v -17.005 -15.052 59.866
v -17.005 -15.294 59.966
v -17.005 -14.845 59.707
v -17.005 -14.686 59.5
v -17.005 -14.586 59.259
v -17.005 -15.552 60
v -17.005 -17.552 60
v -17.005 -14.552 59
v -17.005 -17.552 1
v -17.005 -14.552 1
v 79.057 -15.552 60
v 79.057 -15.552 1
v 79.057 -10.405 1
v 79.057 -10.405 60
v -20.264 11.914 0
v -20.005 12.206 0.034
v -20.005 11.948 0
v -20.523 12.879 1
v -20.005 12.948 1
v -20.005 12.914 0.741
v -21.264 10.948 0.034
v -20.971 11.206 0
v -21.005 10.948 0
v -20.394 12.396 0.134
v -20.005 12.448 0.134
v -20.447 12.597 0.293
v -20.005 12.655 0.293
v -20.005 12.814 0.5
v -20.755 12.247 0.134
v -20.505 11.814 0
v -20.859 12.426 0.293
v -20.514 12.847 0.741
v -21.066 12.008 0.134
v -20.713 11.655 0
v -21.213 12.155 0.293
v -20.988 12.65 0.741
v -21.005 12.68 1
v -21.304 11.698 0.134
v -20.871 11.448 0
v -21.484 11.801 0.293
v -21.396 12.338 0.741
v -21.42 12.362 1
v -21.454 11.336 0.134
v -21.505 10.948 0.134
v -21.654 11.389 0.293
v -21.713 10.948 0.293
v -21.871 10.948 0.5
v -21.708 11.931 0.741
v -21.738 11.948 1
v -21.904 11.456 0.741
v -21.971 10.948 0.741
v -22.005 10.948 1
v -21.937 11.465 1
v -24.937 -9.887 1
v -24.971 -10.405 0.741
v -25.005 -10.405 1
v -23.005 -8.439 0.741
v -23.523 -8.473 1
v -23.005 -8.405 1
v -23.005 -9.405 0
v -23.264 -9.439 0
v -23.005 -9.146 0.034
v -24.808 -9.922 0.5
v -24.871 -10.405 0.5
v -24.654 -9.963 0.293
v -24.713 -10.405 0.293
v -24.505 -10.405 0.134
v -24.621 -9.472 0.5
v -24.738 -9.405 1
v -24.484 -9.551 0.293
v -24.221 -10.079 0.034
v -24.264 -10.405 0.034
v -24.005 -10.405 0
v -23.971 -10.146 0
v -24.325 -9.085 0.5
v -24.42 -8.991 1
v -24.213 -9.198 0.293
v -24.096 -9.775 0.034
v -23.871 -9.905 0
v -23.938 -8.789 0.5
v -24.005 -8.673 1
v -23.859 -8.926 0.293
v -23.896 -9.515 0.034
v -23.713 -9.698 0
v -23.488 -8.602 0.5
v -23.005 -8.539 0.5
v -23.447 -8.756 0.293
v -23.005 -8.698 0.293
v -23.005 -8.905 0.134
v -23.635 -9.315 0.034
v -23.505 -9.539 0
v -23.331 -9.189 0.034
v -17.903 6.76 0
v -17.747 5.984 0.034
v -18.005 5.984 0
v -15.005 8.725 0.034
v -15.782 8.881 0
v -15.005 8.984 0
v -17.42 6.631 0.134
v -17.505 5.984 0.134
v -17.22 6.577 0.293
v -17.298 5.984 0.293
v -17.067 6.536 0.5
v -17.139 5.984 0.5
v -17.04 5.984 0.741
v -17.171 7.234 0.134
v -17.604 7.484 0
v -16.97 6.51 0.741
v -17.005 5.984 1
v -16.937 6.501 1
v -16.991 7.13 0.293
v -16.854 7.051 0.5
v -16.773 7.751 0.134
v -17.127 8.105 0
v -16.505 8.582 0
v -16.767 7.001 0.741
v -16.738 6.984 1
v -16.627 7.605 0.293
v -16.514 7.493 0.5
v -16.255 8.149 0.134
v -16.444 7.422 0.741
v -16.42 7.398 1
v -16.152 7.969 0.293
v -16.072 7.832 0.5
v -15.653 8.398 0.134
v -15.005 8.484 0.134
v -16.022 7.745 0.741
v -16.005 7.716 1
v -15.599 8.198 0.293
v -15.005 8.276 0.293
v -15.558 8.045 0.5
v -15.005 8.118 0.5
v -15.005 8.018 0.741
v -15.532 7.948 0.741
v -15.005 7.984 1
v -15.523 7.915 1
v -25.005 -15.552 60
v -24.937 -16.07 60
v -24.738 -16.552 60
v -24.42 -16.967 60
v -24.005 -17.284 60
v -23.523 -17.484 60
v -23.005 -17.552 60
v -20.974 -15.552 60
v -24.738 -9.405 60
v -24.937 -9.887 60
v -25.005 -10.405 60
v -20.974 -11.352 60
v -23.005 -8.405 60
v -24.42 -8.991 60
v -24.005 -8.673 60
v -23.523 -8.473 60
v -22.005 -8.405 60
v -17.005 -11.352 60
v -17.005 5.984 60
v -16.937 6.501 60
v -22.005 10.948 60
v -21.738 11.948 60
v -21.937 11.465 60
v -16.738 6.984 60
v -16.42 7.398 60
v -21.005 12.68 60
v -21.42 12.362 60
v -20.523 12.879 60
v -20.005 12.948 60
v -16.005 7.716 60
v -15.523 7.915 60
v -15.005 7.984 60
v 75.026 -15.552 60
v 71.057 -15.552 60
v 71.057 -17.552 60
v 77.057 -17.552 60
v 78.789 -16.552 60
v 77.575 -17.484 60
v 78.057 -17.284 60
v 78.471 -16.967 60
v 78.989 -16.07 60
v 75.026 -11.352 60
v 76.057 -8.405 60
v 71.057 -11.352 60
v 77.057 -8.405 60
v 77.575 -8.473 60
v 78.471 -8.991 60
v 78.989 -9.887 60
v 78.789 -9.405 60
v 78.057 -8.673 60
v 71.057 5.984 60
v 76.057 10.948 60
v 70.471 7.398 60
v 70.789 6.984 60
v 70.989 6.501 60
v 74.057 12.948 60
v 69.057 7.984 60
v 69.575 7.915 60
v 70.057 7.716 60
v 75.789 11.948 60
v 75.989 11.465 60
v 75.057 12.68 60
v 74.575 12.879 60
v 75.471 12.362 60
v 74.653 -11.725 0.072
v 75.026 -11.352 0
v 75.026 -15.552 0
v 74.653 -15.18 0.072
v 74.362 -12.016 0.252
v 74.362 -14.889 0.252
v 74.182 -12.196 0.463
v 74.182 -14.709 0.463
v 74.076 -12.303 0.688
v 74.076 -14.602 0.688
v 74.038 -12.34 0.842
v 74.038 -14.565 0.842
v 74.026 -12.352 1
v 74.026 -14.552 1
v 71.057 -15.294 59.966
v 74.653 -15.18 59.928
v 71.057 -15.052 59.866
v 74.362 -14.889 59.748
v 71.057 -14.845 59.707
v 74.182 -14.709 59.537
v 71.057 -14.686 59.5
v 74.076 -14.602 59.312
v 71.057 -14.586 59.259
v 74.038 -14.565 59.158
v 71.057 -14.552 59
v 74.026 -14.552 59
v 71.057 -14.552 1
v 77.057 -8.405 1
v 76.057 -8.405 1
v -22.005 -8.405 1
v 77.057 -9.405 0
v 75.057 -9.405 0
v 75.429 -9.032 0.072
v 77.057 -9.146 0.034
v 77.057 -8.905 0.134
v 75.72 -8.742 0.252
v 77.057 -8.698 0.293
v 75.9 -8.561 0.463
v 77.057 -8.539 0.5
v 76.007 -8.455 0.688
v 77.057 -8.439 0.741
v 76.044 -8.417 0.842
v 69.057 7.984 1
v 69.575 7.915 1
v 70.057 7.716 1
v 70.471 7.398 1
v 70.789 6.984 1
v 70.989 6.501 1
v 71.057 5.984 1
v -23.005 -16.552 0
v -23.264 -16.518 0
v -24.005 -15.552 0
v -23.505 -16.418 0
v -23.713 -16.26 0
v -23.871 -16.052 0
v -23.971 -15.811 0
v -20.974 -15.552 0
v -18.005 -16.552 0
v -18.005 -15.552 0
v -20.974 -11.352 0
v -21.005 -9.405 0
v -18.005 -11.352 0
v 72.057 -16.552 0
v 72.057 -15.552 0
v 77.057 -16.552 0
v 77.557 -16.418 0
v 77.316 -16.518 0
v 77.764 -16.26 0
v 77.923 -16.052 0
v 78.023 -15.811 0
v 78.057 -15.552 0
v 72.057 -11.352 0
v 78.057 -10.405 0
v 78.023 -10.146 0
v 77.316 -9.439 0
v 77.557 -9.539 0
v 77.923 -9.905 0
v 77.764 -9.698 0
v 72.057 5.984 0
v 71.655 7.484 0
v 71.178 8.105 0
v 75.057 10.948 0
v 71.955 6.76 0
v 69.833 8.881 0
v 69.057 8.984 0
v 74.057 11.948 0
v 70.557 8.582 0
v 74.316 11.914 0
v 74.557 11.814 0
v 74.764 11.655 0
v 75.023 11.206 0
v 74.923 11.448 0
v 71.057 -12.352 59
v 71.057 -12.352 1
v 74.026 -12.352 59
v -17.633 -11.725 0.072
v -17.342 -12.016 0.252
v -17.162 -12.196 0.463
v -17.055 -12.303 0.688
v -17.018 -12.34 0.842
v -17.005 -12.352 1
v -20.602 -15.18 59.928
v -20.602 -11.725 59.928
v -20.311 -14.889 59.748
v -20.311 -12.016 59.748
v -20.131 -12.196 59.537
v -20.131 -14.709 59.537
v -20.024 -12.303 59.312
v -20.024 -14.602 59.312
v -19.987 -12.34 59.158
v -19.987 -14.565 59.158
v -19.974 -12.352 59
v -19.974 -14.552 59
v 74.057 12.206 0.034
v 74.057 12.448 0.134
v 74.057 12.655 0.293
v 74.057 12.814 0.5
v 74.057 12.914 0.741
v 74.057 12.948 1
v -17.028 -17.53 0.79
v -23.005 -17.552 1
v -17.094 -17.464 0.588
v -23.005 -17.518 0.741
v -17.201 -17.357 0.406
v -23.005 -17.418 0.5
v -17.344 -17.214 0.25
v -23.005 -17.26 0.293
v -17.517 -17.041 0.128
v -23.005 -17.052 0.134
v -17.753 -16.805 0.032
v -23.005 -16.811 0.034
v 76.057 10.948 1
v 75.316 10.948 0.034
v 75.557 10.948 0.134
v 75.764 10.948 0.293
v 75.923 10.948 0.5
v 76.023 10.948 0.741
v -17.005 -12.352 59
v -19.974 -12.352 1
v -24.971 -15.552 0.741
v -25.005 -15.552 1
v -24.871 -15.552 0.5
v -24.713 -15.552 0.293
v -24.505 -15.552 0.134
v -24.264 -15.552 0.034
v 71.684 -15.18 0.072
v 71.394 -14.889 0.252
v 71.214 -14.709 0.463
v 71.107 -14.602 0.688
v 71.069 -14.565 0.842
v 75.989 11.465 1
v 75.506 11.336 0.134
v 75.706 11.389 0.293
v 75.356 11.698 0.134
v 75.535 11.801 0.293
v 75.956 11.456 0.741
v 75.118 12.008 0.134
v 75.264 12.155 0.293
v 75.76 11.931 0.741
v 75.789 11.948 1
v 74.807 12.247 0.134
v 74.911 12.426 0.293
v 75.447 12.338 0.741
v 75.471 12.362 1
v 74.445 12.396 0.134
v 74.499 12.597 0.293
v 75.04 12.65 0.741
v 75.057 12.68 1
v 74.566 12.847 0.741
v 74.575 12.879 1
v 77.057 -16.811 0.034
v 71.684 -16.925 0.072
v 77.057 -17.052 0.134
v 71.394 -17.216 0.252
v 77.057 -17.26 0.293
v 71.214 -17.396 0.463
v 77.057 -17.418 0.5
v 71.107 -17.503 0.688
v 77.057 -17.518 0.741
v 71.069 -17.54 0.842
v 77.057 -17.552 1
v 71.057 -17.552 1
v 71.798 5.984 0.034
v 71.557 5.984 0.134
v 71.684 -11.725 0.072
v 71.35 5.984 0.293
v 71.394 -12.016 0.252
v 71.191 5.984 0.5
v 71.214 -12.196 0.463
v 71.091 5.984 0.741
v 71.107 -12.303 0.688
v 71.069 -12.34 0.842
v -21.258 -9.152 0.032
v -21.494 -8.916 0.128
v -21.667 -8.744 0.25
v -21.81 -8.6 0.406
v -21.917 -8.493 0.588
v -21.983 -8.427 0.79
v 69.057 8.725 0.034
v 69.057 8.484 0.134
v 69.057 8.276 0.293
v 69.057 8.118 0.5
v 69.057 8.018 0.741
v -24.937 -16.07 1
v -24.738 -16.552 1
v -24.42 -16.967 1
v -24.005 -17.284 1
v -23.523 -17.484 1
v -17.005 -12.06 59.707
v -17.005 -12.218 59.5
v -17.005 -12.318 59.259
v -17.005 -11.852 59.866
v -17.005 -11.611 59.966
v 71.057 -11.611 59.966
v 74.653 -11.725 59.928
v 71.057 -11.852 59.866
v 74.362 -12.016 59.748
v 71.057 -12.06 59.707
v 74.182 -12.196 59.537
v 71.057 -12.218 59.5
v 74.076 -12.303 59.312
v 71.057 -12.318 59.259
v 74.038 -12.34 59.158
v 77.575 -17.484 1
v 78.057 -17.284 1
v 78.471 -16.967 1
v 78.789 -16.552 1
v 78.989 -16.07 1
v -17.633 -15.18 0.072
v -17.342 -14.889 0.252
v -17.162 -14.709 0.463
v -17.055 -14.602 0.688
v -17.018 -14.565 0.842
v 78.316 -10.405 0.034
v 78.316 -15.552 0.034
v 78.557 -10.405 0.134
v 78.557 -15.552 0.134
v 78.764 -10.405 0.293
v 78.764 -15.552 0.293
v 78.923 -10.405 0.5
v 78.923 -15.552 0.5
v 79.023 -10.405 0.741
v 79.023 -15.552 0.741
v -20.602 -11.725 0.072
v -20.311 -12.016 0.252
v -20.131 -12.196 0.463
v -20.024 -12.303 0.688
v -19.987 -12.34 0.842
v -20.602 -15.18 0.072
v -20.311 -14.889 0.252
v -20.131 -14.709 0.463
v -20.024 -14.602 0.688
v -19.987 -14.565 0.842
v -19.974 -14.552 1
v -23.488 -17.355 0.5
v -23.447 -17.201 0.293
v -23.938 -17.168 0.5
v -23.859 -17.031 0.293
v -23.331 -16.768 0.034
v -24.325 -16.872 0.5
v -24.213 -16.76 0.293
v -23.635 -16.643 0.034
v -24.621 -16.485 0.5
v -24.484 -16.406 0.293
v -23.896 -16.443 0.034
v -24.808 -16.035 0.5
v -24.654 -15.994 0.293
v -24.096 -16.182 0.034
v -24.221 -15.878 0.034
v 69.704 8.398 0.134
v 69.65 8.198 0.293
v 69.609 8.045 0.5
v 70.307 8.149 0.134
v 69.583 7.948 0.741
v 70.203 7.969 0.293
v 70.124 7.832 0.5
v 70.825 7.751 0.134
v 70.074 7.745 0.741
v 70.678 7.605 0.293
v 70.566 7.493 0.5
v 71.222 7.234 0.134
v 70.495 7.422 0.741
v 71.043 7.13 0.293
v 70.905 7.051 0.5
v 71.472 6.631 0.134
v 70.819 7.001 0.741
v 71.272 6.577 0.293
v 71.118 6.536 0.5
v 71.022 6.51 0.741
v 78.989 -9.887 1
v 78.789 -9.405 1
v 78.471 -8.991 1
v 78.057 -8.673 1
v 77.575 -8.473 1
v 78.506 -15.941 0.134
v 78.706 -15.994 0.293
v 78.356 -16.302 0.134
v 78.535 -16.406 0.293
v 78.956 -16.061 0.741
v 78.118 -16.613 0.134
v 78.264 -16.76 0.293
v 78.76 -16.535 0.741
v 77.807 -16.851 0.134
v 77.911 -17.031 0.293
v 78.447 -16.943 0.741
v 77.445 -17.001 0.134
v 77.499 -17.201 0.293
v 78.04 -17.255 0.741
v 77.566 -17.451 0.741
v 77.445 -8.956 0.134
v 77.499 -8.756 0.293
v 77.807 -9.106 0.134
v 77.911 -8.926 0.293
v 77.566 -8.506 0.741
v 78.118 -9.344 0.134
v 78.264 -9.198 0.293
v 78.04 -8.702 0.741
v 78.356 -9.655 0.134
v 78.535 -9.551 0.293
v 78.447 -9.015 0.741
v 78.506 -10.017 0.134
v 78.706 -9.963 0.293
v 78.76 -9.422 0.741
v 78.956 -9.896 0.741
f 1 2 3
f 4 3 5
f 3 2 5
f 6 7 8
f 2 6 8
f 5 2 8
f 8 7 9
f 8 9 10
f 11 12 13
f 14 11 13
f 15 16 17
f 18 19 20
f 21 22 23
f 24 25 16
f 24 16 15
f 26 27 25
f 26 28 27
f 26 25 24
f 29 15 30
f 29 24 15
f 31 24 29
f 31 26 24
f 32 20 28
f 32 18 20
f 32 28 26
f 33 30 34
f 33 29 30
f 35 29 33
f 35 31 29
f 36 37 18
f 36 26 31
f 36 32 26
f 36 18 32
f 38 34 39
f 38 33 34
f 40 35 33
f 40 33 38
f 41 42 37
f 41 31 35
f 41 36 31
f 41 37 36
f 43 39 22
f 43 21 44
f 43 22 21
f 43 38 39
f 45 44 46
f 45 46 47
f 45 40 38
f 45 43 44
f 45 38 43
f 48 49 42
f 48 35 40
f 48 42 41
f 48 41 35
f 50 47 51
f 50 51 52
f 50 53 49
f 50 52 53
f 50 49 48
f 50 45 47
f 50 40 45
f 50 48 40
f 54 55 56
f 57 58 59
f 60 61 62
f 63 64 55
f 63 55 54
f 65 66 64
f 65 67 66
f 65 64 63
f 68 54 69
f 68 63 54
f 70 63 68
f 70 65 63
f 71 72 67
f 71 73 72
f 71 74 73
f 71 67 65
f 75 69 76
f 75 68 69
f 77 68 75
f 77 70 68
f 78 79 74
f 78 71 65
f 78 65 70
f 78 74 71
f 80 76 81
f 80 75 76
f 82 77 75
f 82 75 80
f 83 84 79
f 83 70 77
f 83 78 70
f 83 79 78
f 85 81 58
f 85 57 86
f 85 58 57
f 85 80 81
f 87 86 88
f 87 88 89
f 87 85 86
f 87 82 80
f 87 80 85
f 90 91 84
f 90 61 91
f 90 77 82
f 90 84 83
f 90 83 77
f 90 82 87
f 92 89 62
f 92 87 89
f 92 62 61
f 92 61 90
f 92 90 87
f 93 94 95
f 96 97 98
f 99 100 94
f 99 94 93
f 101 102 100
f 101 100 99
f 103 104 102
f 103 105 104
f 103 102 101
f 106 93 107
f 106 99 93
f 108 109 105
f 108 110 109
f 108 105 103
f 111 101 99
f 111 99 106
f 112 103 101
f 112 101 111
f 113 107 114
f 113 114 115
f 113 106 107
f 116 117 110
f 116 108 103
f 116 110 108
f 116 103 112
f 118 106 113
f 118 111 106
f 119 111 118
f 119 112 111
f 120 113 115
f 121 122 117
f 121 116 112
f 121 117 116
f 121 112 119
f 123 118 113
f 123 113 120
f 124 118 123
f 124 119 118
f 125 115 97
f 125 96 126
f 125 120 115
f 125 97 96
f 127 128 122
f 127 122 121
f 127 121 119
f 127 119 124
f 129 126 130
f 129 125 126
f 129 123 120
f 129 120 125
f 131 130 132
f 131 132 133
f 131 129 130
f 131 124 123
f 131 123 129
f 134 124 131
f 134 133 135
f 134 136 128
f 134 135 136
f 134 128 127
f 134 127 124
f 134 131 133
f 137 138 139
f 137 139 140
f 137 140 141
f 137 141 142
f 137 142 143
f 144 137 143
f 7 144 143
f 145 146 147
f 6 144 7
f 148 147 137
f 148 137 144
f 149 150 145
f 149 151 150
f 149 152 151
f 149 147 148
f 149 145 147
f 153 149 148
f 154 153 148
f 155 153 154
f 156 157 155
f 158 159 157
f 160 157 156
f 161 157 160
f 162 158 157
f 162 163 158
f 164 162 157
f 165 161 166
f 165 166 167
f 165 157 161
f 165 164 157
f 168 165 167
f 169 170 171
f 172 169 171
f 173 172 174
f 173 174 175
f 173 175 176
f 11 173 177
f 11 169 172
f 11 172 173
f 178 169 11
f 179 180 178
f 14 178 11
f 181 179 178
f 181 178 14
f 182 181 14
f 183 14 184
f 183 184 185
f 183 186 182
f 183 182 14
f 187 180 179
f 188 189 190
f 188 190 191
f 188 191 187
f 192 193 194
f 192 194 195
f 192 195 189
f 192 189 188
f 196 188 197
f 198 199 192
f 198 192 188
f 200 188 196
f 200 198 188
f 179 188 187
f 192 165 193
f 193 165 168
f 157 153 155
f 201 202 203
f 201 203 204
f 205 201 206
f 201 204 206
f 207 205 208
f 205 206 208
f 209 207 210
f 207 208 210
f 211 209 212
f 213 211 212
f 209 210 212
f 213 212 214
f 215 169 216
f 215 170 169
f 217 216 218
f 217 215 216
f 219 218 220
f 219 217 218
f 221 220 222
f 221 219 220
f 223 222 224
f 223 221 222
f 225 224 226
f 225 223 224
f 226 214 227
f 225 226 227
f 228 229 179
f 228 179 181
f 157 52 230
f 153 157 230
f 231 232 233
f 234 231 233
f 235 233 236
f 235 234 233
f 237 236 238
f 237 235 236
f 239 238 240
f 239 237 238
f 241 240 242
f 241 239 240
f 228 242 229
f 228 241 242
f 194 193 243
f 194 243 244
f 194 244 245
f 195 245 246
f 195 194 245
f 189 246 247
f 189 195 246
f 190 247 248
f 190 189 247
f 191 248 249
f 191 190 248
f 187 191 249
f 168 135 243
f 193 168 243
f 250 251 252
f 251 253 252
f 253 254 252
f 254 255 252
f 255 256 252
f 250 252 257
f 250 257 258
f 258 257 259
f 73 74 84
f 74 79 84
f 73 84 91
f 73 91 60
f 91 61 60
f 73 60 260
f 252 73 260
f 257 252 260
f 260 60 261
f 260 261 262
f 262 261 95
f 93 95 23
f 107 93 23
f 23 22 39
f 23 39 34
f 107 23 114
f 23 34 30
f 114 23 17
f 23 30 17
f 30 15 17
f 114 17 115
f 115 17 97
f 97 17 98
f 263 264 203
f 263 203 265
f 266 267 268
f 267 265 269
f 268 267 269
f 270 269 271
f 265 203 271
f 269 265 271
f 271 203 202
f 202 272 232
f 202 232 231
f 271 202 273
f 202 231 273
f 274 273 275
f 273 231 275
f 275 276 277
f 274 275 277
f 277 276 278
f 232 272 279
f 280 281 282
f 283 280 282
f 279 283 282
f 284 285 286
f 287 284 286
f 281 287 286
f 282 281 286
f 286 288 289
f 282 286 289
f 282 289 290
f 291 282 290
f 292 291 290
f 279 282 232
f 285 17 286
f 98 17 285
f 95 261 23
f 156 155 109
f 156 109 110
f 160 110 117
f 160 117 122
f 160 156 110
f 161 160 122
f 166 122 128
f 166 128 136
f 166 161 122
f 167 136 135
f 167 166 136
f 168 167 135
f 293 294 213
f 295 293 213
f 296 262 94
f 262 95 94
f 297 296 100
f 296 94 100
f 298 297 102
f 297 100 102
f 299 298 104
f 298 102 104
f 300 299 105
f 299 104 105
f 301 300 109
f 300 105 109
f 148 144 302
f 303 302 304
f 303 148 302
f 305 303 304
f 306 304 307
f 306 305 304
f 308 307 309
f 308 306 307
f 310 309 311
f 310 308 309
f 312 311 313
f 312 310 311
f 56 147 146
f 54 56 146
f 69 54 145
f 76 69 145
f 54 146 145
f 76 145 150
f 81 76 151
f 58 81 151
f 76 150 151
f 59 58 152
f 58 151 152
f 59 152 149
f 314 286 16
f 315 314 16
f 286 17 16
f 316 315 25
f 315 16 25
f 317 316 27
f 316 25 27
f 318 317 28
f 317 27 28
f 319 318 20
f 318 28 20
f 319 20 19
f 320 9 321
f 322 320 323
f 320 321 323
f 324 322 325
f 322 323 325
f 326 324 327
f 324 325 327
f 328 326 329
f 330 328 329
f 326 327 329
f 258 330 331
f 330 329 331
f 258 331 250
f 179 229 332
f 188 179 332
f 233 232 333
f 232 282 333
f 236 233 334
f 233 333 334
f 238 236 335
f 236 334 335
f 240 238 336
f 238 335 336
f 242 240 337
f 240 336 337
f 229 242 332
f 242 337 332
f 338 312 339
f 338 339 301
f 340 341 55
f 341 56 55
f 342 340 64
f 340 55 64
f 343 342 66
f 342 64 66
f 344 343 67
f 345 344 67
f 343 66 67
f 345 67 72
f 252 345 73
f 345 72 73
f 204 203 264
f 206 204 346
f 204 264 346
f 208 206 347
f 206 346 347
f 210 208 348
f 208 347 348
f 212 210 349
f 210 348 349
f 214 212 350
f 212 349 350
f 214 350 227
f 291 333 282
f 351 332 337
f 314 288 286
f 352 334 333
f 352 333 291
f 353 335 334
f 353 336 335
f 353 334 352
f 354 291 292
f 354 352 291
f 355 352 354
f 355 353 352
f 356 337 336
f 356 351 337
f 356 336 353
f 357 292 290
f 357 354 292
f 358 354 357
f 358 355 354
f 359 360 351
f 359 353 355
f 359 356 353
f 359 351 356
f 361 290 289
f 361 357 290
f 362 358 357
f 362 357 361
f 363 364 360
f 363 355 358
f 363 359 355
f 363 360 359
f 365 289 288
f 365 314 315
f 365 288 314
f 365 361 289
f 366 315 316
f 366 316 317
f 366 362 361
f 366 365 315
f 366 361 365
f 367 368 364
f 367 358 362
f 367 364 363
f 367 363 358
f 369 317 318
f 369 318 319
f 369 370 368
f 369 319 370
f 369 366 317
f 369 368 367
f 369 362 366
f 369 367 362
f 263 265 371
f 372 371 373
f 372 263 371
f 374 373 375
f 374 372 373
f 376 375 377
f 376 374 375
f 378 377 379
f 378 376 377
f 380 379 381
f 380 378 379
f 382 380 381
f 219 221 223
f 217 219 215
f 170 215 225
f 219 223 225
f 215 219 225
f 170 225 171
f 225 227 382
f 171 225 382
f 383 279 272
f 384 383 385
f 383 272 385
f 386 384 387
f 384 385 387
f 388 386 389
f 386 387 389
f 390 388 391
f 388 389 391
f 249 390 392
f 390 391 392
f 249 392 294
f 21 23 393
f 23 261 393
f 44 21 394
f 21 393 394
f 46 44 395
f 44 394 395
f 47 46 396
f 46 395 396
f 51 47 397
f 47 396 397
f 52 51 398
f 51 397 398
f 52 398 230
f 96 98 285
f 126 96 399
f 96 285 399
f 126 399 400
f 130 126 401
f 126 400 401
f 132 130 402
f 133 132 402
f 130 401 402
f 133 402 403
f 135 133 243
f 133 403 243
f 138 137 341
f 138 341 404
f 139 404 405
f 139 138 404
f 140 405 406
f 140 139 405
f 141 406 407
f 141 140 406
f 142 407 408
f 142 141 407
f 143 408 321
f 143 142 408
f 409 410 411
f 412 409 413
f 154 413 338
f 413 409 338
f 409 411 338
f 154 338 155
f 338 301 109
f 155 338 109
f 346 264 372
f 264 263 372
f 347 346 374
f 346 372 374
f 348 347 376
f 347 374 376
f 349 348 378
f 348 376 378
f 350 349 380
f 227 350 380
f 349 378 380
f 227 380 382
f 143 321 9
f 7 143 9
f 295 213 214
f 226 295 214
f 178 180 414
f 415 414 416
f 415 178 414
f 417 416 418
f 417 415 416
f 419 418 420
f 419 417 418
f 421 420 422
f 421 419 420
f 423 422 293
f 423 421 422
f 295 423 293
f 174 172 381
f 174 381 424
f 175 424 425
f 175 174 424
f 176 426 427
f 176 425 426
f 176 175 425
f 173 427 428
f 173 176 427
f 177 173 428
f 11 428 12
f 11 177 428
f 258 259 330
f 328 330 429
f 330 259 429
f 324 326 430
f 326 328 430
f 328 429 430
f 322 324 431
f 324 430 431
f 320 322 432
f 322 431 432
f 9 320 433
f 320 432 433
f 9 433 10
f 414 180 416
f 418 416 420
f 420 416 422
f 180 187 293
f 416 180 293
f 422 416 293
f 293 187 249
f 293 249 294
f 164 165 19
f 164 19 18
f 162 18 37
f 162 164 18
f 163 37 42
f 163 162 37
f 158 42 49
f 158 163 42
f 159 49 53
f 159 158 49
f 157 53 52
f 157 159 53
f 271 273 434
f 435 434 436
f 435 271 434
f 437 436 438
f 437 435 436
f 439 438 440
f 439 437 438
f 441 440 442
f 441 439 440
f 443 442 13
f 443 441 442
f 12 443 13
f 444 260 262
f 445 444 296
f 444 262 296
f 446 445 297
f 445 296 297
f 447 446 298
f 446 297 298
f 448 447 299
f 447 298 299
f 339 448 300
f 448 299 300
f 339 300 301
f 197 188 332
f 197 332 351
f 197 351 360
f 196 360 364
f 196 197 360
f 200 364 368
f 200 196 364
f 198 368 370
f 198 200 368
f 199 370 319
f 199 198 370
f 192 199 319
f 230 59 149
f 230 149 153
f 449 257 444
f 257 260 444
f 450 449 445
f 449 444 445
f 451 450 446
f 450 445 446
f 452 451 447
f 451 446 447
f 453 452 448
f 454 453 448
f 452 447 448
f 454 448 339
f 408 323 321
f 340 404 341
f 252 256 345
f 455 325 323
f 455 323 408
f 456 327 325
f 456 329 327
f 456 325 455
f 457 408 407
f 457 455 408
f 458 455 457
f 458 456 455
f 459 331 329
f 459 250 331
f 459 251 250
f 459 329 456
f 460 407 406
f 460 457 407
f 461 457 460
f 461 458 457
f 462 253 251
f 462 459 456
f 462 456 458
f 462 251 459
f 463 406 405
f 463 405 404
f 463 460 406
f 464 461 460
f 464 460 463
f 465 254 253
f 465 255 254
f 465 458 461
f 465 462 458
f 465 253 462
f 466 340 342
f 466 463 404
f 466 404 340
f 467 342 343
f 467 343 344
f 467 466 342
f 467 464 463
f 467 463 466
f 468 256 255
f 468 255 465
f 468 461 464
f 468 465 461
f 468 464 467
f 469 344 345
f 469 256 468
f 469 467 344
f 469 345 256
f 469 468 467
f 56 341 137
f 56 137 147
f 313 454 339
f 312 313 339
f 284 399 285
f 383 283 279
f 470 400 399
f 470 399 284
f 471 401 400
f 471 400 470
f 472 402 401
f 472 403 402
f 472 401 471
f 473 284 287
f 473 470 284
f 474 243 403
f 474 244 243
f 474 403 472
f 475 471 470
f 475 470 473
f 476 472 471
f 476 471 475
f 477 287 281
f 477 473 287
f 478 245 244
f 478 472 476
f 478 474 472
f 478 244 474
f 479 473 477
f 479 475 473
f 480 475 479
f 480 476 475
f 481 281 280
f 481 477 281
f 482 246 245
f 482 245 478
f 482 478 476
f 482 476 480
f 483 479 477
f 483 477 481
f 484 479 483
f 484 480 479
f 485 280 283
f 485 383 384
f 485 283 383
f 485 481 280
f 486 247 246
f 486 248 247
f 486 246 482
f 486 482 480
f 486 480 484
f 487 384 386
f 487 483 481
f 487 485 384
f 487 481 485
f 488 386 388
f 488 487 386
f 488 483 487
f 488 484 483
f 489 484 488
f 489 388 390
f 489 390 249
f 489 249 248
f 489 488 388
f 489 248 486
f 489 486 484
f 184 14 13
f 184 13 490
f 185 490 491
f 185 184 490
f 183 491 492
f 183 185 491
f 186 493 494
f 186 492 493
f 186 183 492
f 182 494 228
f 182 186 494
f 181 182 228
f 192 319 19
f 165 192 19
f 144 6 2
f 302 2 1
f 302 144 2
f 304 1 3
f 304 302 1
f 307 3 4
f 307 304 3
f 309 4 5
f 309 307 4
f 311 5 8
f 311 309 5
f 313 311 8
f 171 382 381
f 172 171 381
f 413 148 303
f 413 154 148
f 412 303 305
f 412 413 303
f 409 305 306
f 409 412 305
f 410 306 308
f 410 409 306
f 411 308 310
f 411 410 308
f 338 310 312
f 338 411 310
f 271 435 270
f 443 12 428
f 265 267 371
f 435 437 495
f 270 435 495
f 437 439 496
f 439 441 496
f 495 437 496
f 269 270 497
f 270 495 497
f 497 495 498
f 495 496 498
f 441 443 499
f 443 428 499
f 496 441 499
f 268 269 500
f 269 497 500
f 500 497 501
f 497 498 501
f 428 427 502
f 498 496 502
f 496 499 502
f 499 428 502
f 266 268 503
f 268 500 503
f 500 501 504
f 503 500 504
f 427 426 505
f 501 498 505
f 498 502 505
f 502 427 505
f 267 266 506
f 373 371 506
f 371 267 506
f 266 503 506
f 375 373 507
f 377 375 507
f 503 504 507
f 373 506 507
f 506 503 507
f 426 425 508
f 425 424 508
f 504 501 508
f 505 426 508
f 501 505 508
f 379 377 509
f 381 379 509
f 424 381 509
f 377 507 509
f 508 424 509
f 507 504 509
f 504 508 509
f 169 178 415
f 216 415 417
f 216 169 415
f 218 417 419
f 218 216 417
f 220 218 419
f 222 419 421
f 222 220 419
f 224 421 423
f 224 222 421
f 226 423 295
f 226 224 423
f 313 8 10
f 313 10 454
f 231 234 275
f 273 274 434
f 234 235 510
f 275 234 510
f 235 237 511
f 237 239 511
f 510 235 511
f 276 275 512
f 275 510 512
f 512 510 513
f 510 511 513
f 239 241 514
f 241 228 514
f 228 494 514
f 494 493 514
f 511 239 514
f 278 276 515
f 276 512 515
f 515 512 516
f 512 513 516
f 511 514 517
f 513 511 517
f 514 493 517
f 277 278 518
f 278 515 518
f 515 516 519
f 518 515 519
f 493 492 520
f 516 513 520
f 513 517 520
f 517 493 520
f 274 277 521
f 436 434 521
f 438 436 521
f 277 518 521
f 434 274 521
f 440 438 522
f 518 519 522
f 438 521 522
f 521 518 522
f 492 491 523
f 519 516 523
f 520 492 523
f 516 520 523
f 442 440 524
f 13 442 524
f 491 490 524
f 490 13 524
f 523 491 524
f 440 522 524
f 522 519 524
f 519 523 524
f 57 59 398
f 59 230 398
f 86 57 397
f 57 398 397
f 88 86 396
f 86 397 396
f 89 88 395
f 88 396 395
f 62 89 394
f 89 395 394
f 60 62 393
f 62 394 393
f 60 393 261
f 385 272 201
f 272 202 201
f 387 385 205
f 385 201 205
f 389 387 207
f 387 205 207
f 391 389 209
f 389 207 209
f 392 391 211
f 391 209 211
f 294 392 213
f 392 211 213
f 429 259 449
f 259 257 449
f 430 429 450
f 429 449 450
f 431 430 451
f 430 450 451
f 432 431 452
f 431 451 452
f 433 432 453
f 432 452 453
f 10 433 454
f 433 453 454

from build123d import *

# Parameters (mm, degrees)
F0_W     = 3
F0_H     = 9.1476
F1_DEPTH = 60
F2_R     = 2
F3_R     = 1


with BuildPart() as f1:
    # F0 (on Top) → F1 (new body)
    with BuildSketch(Plane.XY):
        with Locations((-23.505458, -12.97862)):
            Rectangle(F0_W, F0_H)
        Polygon((76.056968, 12.94758), (-22.005458, 12.94758), (-22.005458, -8.40482), (-22.005458, -17.55242), (-17.005458, -17.55242), (-17.005458, -14.55242), (-19.974245, -14.55242), (-19.974245, -12.35242), (-17.005458, -12.35242), (-17.005458, 7.983583), (71.056968, 7.983583), (71.056968, -12.35242), (74.025755, -12.35242), (74.025755, -14.55242), (71.056968, -14.55242), (71.056968, -17.55242), (76.056968, -17.55242), (76.056968, -8.40482), align=None)
        with Locations((77.556968, -12.97862)):
            Rectangle(F0_W, F0_H)
    extrude(amount=F1_DEPTH)

    # F2
    f2_edges = [f1.edges().sort_by_distance(p)[0] for p in [
        (-22.005458, 12.94758, 30),
        (76.056968, 12.94758, 30),
        (-25.005458, -8.40482, 30),
        (-25.005458, -17.55242, 30),
        (79.056968, -8.40482, 30),
        (79.056968, -17.55242, 30),
        (-17.005458, 7.983583, 30),
        (71.056968, 7.983583, 30),
    ]]
    fillet(f2_edges, radius=F2_R)

    # F3
    f3_edges = [f1.edges().sort_by_distance(p)[0] for p in [
        (-18.489851, -14.55242, 0),
        (-18.489851, -12.35242, 0),
        (-19.974245, -13.45242, 0),
        (-18.489851, -12.35242, 60),
        (-19.974245, -13.45242, 60),
        (-18.489851, -14.55242, 60),
        (72.541362, -14.55242, 0),
        (-25.005458, -12.97862, 0),
        (-24.419671, -8.990607, 0),
        (-24.419671, -16.966634, 0),
        (-22.505458, -8.40482, 0),
        (-20.005458, -17.55242, 0),
        (-22.005458, 1.27138, 0),
        (-17.005458, -16.05242, 0),
        (-21.419671, 12.361793, 0),
        (27.025755, 12.94758, 0),
        (75.471182, 12.361793, 0),
        (76.056968, 1.27138, 0),
        (-17.005458, -3.184419, 0),
        (76.556968, -8.40482, 0),
        (-16.419671, 7.397797, 0),
        (78.471182, -8.990607, 0),
        (27.025755, 7.983583, 0),
        (79.056968, -12.97862, 0),
        (70.471182, 7.397797, 0),
        (78.471182, -16.966634, 0),
        (71.056968, -3.184419, 0),
        (74.056968, -17.55242, 0),
        (72.541362, -12.35242, 0),
        (71.056968, -16.05242, 0),
        (74.025755, -13.45242, 0),
        (72.541362, -14.55242, 60),
        (74.025755, -13.45242, 60),
        (72.541362, -12.35242, 60),
    ]]
    fillet(f3_edges, radius=F3_R)


solid = f1.part
